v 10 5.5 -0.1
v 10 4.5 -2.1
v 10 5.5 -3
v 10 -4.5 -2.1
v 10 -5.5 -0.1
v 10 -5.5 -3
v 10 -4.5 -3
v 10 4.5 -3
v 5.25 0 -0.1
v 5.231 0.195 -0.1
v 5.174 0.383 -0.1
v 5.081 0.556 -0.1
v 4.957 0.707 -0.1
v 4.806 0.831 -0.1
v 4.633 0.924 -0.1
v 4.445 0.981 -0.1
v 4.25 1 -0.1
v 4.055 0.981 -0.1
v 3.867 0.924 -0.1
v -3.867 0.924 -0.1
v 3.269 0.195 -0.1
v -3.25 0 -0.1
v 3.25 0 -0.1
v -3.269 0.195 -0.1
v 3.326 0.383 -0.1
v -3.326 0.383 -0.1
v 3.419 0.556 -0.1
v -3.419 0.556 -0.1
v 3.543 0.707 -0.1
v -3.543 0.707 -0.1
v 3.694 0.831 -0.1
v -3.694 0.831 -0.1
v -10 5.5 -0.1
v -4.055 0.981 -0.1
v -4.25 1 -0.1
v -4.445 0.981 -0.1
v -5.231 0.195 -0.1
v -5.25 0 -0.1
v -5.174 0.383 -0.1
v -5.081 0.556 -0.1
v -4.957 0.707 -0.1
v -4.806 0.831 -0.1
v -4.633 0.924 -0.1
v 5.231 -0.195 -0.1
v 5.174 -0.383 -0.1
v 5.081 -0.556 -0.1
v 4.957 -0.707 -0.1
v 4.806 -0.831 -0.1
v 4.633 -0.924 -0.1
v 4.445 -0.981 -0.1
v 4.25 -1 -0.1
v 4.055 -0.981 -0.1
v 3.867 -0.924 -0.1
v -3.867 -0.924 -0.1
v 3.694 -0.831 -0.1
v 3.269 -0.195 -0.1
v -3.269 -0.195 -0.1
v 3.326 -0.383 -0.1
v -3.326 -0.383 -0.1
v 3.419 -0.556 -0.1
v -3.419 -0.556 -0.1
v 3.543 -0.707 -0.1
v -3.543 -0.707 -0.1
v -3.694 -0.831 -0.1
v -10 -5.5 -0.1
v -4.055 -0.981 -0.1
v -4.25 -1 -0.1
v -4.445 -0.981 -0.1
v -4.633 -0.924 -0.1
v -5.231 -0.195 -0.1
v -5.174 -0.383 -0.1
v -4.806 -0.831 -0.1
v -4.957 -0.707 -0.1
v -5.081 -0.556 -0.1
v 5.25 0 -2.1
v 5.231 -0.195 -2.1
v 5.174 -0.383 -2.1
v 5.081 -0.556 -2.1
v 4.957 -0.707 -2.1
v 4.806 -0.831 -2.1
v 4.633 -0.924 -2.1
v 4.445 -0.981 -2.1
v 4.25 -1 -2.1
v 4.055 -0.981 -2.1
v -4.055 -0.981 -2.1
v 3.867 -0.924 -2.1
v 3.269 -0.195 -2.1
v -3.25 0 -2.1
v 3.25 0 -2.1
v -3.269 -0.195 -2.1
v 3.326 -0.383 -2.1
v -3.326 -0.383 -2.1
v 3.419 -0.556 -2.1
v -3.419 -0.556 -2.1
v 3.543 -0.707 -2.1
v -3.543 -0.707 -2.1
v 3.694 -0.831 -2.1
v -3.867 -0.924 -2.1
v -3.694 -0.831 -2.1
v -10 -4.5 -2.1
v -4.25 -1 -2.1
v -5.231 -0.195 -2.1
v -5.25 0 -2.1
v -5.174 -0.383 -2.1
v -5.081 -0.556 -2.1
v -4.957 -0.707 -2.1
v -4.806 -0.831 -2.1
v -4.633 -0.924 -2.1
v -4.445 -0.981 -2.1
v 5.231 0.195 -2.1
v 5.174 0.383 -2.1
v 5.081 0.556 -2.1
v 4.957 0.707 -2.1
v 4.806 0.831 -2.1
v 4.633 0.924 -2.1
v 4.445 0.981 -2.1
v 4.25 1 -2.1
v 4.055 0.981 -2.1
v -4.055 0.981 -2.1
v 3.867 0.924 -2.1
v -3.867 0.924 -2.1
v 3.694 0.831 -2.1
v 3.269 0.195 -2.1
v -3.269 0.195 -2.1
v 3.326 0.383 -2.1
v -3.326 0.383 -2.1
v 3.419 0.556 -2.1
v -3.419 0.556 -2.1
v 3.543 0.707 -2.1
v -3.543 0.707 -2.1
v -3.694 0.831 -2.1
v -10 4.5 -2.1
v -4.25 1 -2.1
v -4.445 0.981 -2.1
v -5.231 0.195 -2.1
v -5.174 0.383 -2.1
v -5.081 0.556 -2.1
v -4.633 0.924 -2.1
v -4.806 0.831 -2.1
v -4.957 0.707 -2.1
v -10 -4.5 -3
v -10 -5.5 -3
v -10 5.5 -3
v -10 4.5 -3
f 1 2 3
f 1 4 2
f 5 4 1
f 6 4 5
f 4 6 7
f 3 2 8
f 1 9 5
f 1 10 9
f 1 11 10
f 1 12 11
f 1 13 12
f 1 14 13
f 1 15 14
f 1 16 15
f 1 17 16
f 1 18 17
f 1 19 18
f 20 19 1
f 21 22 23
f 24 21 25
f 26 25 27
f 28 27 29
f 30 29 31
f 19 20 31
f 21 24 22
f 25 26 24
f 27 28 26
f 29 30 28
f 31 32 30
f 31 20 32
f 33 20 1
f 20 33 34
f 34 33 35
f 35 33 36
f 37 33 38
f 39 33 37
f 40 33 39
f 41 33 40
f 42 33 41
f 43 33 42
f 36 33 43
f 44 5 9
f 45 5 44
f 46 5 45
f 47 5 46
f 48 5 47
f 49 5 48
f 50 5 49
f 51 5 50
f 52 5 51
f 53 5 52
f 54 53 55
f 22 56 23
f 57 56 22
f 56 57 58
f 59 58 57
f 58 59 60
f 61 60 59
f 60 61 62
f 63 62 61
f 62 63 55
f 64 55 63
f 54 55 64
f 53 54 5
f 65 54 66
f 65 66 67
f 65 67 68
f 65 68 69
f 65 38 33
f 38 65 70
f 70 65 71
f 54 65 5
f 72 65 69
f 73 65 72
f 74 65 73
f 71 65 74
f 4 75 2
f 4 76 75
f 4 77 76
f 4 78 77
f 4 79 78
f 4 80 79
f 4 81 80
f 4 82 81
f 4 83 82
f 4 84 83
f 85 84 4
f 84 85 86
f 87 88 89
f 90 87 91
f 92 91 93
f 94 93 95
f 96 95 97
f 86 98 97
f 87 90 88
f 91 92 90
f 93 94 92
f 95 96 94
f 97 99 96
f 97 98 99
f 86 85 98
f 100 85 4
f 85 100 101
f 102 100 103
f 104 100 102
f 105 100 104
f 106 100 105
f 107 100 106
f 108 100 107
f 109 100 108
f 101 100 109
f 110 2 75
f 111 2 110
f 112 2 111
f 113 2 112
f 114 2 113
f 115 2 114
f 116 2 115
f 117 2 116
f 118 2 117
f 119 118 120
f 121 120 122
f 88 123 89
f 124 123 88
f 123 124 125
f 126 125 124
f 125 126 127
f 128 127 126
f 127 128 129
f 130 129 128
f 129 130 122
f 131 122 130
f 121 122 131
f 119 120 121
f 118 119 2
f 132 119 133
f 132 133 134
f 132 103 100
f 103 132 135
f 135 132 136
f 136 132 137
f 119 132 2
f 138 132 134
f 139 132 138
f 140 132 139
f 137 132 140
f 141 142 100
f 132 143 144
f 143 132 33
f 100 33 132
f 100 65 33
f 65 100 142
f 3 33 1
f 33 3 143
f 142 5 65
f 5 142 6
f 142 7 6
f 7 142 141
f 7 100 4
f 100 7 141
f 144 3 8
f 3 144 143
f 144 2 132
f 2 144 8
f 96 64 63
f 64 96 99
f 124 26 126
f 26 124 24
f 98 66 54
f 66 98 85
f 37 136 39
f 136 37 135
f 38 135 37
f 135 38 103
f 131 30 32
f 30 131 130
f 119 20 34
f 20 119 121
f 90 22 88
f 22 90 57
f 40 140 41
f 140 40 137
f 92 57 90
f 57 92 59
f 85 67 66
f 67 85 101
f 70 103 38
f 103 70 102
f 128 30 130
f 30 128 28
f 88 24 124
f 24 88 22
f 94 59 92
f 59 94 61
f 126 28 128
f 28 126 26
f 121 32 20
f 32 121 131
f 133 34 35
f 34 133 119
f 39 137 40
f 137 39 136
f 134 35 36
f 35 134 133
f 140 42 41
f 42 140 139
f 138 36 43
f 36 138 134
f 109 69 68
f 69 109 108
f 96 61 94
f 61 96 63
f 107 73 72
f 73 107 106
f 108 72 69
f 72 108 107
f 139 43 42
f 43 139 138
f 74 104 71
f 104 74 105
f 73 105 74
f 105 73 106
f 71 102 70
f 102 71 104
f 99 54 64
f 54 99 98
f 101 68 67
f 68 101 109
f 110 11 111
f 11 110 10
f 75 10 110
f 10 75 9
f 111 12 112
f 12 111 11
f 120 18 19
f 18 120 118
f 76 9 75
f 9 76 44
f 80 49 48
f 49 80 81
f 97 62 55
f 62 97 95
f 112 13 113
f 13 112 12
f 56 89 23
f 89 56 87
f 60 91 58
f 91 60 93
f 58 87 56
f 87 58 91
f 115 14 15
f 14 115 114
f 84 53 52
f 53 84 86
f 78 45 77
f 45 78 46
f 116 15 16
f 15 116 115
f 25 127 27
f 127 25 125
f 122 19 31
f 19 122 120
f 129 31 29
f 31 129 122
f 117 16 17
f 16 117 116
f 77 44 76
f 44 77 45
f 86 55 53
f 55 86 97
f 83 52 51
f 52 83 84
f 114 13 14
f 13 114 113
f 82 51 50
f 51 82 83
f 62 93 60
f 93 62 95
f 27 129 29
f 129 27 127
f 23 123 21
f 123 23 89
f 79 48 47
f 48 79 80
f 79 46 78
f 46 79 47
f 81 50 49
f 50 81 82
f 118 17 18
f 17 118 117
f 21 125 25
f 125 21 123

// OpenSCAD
$fn=32;
dbu=7.8;
dpin=2;
dpindist=9.5;
dtoppin=2;
dep=11;
topdep=20;
baseth=2;
topth=0.8;
stth=1;
buth=3.4;
b1x=0;
b2x=20;
b3x=-20;
width=20;//70

makebutton(b1x);
makebutton(b2x);
makebutton(b3x);

//upper lane
*difference(){
    translate([0,0,buth+topth/2]) cube([width,topdep,topth],center=true);    
    makebuttontopout(b1x);
    makebuttontopout(b2x);
    makebuttontopout(b3x);
}
//lower lane
difference(){
    union(){
        
        translate([0,0,-baseth/2-0.1]) cube([width,dep,baseth],center=true);        
        translate([0,-dep/2+0.5,-2.5]) cube([width,1,stth],center=true);
        translate([0,dep/2-0.5,-2.5]) cube([width,1,stth],center=true);
    }
    makebuttoncutout(b1x);
    makebuttoncutout(b2x);
    makebuttoncutout(b3x);
}


module makebutton(tx){
    *translate([45+tx,-85,0]) import ("pressed_adafruit_square_tactile_button_1010.stl",convexity=3);
}

module makebuttoncutout(tx){
    dxofs=dpindist/2-dpin/4;
    translate([tx,0,0]){
        translate([-dxofs,0,-baseth-0.2]) cylinder(r=dpin/2,h=baseth+0.2);
        translate([+dxofs,0,-baseth-0.2]) cylinder(r=dpin/2,h=baseth+0.2);
        
        //#translate([-5-2/2,0,-baseth-0.2]) cylinder(r=2/2,h=baseth+0.2);
    }
}

module makebuttontopout(tx){
    
    translate([tx,0,buth+2.6]){
        translate([0,0,-baseth-0.7]) cylinder(r=dbu/2,h=1.1);
        translate([-(4.8-dtoppin/2),4.9-dtoppin/2,-baseth-0.2]) cube([dtoppin,dtoppin,1],center=true);
        translate([+(4.8-dtoppin/2),4.9-dtoppin/2,-baseth-0.2]) cube([dtoppin,dtoppin,1],center=true);
        translate([-(4.8-dtoppin/2),-4.9+dtoppin/2,-baseth-0.2]) cube([dtoppin,dtoppin,1],center=true);
        translate([+(4.8-dtoppin/2),-4.9+dtoppin/2,-baseth-0.2]) cube([dtoppin,dtoppin,1],center=true);
    }
}
